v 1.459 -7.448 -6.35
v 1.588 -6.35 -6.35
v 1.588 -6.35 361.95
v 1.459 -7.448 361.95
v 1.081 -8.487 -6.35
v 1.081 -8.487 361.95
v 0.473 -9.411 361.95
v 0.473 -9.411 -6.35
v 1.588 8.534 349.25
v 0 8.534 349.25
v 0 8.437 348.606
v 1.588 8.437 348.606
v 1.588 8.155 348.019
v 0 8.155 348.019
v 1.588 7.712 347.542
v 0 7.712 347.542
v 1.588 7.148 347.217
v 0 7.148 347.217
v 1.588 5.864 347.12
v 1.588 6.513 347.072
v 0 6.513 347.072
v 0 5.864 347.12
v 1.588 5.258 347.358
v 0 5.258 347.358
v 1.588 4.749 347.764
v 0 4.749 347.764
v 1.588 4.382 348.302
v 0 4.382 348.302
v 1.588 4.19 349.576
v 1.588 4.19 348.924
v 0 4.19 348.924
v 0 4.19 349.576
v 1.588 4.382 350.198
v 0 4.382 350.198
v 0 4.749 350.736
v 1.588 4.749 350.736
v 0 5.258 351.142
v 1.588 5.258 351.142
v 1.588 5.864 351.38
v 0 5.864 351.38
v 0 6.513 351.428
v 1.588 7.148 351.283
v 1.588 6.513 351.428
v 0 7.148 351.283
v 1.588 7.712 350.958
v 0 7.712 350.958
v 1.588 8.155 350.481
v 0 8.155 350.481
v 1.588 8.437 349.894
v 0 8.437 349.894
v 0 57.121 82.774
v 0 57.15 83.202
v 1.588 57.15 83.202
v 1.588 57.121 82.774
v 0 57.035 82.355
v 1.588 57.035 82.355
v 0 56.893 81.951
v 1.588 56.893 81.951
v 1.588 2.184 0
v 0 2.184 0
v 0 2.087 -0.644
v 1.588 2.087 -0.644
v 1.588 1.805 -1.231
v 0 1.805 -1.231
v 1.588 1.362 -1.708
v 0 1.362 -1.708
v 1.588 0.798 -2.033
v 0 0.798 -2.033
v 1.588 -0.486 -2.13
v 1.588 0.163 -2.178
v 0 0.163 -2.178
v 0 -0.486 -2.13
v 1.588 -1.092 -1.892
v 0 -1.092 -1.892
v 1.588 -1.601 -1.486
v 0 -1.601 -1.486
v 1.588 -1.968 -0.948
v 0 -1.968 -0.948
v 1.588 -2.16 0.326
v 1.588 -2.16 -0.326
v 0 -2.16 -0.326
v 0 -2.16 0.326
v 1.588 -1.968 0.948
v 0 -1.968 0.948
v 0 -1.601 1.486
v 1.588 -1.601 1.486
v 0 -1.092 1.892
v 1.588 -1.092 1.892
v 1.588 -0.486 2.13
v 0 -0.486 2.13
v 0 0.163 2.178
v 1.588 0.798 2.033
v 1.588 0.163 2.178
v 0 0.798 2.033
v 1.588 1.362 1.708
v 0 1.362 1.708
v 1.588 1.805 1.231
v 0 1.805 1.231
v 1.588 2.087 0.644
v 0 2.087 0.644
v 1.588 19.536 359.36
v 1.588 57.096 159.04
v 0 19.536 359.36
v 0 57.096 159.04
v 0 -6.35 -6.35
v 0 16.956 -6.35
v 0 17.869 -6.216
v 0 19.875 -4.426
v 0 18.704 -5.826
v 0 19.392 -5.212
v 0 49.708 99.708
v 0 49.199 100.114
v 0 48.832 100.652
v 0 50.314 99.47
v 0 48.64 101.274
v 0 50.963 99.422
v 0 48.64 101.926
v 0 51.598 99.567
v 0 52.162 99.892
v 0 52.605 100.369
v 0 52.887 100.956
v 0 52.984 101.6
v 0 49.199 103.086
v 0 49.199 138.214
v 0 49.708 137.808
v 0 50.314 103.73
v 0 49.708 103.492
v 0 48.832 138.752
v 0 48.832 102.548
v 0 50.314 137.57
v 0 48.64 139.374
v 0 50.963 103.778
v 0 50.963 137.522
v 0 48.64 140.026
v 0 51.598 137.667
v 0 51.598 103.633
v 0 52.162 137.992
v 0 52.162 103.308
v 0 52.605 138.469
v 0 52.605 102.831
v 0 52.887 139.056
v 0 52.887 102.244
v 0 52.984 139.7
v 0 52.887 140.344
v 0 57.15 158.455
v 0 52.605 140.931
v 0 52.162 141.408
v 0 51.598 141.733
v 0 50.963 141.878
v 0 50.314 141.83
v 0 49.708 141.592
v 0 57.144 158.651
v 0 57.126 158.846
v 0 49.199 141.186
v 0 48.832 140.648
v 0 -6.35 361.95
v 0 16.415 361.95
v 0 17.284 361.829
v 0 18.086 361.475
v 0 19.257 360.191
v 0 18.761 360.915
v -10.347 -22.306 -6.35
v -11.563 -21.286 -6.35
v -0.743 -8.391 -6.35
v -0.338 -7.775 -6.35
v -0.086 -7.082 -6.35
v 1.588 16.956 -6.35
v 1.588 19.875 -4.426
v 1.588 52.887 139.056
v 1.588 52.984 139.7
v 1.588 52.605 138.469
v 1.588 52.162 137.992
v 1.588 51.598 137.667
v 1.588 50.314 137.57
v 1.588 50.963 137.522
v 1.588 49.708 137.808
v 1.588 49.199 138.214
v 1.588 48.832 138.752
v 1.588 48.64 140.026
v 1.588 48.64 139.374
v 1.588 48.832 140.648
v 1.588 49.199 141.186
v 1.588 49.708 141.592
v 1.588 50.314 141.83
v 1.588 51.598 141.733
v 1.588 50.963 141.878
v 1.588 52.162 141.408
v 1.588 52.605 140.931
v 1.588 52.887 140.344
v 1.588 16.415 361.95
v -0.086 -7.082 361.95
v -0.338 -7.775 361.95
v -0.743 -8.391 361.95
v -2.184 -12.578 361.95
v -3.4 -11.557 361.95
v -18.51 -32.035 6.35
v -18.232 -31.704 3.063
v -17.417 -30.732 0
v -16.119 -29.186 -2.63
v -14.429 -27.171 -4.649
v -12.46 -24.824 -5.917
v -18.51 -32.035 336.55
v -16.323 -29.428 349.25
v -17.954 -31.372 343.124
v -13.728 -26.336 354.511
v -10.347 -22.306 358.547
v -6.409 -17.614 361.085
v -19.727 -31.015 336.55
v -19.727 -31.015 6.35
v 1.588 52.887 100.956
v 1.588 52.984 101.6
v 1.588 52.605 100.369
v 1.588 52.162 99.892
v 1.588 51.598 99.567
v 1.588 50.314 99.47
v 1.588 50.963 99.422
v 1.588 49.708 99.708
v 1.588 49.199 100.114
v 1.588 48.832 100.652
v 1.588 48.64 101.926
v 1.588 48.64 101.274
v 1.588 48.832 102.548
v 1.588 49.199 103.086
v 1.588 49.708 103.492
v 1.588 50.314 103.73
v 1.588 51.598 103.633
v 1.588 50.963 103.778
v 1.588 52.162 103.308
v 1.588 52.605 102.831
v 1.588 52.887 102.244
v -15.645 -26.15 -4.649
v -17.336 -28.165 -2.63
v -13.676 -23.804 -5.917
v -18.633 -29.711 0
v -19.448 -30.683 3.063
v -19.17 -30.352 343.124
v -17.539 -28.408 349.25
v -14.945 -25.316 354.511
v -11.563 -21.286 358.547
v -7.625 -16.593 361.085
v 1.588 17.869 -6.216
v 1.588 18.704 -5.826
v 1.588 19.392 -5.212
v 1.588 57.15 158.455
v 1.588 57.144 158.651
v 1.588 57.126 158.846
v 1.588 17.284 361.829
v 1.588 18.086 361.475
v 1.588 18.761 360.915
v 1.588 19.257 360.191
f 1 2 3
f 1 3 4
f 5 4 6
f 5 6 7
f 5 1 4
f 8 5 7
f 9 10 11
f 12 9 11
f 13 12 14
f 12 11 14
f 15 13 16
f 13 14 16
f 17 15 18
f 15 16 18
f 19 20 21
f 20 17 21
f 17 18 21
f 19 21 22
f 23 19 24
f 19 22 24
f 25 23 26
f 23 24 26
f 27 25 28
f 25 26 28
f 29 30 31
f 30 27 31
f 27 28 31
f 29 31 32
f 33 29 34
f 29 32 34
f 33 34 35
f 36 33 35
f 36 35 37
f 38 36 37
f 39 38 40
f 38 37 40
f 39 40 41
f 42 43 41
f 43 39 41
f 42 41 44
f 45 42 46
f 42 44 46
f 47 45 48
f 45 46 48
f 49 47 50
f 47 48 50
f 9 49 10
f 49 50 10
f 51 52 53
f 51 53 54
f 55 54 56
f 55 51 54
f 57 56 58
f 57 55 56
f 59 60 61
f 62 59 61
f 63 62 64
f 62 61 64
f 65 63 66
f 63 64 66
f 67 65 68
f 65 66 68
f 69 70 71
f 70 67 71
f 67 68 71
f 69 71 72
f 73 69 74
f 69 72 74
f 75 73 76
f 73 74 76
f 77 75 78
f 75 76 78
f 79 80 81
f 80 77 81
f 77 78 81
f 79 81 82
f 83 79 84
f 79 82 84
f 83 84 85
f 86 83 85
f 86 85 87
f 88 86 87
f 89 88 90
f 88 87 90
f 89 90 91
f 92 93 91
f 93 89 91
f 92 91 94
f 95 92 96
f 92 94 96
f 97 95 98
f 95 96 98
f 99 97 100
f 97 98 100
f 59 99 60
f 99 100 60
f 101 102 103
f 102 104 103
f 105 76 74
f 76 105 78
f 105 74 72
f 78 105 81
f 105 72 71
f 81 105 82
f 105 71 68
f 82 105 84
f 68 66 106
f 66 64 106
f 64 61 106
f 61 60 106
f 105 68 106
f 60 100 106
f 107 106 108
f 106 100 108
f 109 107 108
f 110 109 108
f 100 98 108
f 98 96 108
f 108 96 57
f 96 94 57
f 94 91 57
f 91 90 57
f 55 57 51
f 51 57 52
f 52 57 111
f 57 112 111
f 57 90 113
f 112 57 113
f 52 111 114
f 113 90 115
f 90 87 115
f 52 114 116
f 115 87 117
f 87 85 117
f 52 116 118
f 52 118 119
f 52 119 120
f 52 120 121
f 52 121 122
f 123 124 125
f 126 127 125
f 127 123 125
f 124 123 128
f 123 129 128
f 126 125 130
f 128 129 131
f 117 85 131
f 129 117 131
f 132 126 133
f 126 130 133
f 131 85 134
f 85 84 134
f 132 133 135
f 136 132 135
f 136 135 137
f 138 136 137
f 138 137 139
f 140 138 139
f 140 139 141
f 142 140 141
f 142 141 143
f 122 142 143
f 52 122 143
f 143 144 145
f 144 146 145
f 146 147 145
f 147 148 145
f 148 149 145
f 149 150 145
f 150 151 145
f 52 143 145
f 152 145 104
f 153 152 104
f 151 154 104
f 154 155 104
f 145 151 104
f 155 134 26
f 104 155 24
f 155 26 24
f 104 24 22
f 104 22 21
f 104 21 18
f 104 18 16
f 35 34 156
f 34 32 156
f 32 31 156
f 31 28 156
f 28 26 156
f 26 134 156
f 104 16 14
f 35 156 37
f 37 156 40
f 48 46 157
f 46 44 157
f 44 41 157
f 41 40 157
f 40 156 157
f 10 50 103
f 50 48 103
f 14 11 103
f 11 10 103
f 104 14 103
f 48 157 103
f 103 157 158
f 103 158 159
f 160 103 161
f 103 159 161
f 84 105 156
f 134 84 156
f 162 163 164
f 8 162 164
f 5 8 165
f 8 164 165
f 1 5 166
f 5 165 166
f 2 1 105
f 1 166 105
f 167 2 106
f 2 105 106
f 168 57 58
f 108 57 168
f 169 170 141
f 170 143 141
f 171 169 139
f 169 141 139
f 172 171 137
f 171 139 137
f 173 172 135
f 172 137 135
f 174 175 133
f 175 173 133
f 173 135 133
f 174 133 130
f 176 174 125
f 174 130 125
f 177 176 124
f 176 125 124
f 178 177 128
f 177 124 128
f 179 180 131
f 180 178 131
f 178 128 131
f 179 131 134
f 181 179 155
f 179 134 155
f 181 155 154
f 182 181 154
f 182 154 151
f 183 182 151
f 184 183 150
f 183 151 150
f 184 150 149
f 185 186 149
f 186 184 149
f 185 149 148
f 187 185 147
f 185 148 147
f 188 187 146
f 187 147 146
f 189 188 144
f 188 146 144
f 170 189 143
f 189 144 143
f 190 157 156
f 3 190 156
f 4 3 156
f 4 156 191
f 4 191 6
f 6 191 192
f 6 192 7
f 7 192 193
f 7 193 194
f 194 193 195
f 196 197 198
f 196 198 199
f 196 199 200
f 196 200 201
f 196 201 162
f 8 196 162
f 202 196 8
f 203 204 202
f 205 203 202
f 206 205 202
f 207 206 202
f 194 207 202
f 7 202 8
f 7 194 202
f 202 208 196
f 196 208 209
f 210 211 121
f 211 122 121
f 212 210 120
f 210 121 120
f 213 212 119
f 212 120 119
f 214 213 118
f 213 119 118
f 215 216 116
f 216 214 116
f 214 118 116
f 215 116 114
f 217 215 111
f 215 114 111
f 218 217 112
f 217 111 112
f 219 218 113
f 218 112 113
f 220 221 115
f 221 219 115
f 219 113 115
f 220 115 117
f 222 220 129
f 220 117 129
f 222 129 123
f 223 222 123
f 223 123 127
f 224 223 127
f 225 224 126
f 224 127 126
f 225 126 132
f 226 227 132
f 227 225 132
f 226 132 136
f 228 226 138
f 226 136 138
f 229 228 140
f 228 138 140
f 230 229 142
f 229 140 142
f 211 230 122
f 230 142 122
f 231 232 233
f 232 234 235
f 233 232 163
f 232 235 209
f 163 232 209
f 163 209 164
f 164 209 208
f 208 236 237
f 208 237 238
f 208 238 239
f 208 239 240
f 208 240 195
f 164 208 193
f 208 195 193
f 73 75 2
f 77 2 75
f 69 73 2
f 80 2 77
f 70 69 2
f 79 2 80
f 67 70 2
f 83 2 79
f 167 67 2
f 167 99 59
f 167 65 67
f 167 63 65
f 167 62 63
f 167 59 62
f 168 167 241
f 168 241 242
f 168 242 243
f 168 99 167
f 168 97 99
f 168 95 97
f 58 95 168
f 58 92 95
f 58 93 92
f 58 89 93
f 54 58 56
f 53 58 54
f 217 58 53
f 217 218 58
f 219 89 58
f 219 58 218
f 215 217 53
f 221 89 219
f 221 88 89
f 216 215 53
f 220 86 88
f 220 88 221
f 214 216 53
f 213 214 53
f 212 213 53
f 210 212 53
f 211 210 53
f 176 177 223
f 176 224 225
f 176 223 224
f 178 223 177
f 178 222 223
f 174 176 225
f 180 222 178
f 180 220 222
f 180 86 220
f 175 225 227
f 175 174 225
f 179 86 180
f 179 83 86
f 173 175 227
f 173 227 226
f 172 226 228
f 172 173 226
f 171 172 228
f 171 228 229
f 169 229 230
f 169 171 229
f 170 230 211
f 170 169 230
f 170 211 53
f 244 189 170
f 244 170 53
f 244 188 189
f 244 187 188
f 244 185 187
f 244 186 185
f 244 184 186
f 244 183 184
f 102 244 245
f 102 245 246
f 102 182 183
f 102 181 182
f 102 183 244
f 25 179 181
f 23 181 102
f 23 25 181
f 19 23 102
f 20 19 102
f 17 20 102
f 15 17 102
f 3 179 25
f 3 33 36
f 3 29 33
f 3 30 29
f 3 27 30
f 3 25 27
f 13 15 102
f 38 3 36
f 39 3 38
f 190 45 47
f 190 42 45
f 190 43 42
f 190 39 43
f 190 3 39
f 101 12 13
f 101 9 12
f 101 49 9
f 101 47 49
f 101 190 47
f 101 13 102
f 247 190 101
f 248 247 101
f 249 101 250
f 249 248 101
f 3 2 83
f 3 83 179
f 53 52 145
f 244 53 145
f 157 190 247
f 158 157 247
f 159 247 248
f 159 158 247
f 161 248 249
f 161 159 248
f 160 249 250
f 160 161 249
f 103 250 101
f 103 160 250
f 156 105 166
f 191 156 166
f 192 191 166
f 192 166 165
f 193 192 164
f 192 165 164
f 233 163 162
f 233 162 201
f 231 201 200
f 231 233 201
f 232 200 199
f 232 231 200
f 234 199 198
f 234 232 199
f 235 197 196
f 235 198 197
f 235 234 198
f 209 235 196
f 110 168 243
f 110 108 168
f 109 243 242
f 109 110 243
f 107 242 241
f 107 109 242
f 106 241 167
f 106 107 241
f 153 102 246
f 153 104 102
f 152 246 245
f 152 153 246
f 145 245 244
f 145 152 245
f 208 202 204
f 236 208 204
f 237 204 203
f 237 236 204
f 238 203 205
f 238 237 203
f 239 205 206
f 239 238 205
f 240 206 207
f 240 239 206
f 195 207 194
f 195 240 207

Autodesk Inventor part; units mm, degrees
ref_plane "YZ Plane" through (0, 0, 0) normal (1, 0, 0) x (0, 1, 0)
ref_plane "XZ Plane" through (0, 0, 0) normal (0, 1, 0) x (-1, 0, 0)
ref_plane "XY Plane" through (0, 0, 0) normal (0, 0, 1) x (1, 0, 0)
sketch "main" plane through (0, 0, 0) normal (0, 0, 1) x (1, 0, 0)
  circle A0 centre (51.9329, 240.4167) radius 2.1844
  line L0 (60.6642, 253.1167) -> (43.2017, 253.1167)
  arc A1 (32.8829, 253.1167) -> (7.4829, 227.7167) centre (32.8829, 227.7167) ccw
  line L1 (39.2329, 253.1167) -> (32.8829, 253.1167)
  line L2 (39.2329, 249.9417) -> (39.2329, 253.1167)
  line L3 (39.2329, 253.1167) -> (42.4079, 253.1167)
  line L4 (42.4079, 253.1167) -> (43.2017, 253.1167)
  arc A2 (65.1185, 250.5268) -> (61.9979, 253.1167) centre (61.9979, 249.9417) ccw
  line L5 (61.9979, 253.1167) -> (60.6642, 253.1167)
  line L6 (42.4079, -115.1833) -> (62.5393, -115.1833)
  arc A3 (7.4829, -102.4833) -> (20.1829, -115.1833) centre (20.1829, -102.4833) ccw
  line L7 (20.1829, -115.1833) -> (42.4079, -115.1833)
  arc A4 (62.5393, -115.1833) -> (65.4576, -113.259) centre (62.5393, -112.0083) ccw
  line L8 (39.2329, 249.9417) -> (39.2329, -115.1833)
  line L9 (102.4762, -26.8823) -> (65.4576, -113.259)
  line L10 (102.7329, -25.6316) -> (102.7329, 49.6216)
  line L11 (102.6786, 50.2068) -> (65.1185, 250.5268)
  line L12 (7.4829, 227.7167) -> (7.4829, -102.4833)
  arc A5 (102.7329, 49.6216) -> (102.6786, 50.2068) centre (99.5579, 49.6216) ccw
  circle A6 centre (96.3829, 30.8667) radius 2.1844
  circle A7 centre (96.3829, -7.2333) radius 2.1844
  arc A8 (102.4762, -26.8823) -> (102.7329, -25.6316) centre (99.5579, -25.6316) ccw
  circle A9 centre (45.5829, -108.8333) radius 2.1844
  point P0 (57.0821, 72.2396)
  point P1 (7.4829, 253.1167)
  point P2 (64.6329, -115.1833)
  point P3 (102.7329, -26.2833)
  dimension "d0" = 25.4
  dimension "d1" = 3.175
  dimension "d2" = 3.175
  dimension "d3" = 3.175
  dimension "d4" = 31.75
  dimension "d5" = 90
  dimension "d6" = 25.4
  dimension "d7" = 12.7
sketch "Sketch1" plane through (0, 0, 0) normal (1, 0, 0) x (0, 1, 0)
  circle A0 centre (6.35, 349.25) radius 2.1844
  line L0 (15.0812, 361.95) -> (-2.3813, 361.95)
  arc A1 (-12.7, 361.95) -> (-38.1, 336.55) centre (-12.7, 336.55) ccw
  line L1 (-6.35, 361.95) -> (-12.7, 361.95)
  line L2 (-6.35, 358.775) -> (-6.35, 361.95)
  line L3 (-6.35, 361.95) -> (-3.175, 361.95)
  line L4 (-3.175, 361.95) -> (-2.3813, 361.95)
  arc A2 (19.5356, 359.3601) -> (16.415, 361.95) centre (16.415, 358.775) ccw
  line L5 (16.415, 361.95) -> (15.0812, 361.95)
  line L6 (-3.175, -6.35) -> (16.9564, -6.35)
  arc A3 (-38.1, 6.35) -> (-25.4, -6.35) centre (-25.4, 6.35) ccw
  line L7 (-25.4, -6.35) -> (-3.175, -6.35)
  arc A4 (16.9564, -6.35) -> (19.8747, -4.4257) centre (16.9564, -3.175) ccw
  line L8 (-6.35, 358.775) -> (-6.35, -6.35)
  line L9 (56.8933, 81.951) -> (19.8747, -4.4257)
  line L10 (57.15, 83.2017) -> (57.15, 158.4549)
  line L11 (57.0956, 159.04) -> (19.5356, 359.3601)
  line L12 (-38.1, 336.55) -> (-38.1, 6.35)
  arc A5 (57.15, 158.4549) -> (57.0956, 159.04) centre (53.975, 158.4549) ccw
  circle A6 centre (50.8, 139.7) radius 2.1844
  circle A7 centre (50.8, 101.6) radius 2.1844
  arc A8 (56.8933, 81.951) -> (57.15, 83.2017) centre (53.975, 83.2017) ccw
  circle A9 centre (0, 0) radius 2.1844
extrude "Extrusion1" add sketch "Sketch1" along normal blind 1.5875
bend part "Bend Part1" radius 3.175 angle 40 line through (0, -6.35, 358.775) along (0, 0, -1) centre toward (-1, 0, 0) moving side (0, -1, 0) both sides no
properties part number "side_panel_mirrored" material "Acetal Resin, White"
